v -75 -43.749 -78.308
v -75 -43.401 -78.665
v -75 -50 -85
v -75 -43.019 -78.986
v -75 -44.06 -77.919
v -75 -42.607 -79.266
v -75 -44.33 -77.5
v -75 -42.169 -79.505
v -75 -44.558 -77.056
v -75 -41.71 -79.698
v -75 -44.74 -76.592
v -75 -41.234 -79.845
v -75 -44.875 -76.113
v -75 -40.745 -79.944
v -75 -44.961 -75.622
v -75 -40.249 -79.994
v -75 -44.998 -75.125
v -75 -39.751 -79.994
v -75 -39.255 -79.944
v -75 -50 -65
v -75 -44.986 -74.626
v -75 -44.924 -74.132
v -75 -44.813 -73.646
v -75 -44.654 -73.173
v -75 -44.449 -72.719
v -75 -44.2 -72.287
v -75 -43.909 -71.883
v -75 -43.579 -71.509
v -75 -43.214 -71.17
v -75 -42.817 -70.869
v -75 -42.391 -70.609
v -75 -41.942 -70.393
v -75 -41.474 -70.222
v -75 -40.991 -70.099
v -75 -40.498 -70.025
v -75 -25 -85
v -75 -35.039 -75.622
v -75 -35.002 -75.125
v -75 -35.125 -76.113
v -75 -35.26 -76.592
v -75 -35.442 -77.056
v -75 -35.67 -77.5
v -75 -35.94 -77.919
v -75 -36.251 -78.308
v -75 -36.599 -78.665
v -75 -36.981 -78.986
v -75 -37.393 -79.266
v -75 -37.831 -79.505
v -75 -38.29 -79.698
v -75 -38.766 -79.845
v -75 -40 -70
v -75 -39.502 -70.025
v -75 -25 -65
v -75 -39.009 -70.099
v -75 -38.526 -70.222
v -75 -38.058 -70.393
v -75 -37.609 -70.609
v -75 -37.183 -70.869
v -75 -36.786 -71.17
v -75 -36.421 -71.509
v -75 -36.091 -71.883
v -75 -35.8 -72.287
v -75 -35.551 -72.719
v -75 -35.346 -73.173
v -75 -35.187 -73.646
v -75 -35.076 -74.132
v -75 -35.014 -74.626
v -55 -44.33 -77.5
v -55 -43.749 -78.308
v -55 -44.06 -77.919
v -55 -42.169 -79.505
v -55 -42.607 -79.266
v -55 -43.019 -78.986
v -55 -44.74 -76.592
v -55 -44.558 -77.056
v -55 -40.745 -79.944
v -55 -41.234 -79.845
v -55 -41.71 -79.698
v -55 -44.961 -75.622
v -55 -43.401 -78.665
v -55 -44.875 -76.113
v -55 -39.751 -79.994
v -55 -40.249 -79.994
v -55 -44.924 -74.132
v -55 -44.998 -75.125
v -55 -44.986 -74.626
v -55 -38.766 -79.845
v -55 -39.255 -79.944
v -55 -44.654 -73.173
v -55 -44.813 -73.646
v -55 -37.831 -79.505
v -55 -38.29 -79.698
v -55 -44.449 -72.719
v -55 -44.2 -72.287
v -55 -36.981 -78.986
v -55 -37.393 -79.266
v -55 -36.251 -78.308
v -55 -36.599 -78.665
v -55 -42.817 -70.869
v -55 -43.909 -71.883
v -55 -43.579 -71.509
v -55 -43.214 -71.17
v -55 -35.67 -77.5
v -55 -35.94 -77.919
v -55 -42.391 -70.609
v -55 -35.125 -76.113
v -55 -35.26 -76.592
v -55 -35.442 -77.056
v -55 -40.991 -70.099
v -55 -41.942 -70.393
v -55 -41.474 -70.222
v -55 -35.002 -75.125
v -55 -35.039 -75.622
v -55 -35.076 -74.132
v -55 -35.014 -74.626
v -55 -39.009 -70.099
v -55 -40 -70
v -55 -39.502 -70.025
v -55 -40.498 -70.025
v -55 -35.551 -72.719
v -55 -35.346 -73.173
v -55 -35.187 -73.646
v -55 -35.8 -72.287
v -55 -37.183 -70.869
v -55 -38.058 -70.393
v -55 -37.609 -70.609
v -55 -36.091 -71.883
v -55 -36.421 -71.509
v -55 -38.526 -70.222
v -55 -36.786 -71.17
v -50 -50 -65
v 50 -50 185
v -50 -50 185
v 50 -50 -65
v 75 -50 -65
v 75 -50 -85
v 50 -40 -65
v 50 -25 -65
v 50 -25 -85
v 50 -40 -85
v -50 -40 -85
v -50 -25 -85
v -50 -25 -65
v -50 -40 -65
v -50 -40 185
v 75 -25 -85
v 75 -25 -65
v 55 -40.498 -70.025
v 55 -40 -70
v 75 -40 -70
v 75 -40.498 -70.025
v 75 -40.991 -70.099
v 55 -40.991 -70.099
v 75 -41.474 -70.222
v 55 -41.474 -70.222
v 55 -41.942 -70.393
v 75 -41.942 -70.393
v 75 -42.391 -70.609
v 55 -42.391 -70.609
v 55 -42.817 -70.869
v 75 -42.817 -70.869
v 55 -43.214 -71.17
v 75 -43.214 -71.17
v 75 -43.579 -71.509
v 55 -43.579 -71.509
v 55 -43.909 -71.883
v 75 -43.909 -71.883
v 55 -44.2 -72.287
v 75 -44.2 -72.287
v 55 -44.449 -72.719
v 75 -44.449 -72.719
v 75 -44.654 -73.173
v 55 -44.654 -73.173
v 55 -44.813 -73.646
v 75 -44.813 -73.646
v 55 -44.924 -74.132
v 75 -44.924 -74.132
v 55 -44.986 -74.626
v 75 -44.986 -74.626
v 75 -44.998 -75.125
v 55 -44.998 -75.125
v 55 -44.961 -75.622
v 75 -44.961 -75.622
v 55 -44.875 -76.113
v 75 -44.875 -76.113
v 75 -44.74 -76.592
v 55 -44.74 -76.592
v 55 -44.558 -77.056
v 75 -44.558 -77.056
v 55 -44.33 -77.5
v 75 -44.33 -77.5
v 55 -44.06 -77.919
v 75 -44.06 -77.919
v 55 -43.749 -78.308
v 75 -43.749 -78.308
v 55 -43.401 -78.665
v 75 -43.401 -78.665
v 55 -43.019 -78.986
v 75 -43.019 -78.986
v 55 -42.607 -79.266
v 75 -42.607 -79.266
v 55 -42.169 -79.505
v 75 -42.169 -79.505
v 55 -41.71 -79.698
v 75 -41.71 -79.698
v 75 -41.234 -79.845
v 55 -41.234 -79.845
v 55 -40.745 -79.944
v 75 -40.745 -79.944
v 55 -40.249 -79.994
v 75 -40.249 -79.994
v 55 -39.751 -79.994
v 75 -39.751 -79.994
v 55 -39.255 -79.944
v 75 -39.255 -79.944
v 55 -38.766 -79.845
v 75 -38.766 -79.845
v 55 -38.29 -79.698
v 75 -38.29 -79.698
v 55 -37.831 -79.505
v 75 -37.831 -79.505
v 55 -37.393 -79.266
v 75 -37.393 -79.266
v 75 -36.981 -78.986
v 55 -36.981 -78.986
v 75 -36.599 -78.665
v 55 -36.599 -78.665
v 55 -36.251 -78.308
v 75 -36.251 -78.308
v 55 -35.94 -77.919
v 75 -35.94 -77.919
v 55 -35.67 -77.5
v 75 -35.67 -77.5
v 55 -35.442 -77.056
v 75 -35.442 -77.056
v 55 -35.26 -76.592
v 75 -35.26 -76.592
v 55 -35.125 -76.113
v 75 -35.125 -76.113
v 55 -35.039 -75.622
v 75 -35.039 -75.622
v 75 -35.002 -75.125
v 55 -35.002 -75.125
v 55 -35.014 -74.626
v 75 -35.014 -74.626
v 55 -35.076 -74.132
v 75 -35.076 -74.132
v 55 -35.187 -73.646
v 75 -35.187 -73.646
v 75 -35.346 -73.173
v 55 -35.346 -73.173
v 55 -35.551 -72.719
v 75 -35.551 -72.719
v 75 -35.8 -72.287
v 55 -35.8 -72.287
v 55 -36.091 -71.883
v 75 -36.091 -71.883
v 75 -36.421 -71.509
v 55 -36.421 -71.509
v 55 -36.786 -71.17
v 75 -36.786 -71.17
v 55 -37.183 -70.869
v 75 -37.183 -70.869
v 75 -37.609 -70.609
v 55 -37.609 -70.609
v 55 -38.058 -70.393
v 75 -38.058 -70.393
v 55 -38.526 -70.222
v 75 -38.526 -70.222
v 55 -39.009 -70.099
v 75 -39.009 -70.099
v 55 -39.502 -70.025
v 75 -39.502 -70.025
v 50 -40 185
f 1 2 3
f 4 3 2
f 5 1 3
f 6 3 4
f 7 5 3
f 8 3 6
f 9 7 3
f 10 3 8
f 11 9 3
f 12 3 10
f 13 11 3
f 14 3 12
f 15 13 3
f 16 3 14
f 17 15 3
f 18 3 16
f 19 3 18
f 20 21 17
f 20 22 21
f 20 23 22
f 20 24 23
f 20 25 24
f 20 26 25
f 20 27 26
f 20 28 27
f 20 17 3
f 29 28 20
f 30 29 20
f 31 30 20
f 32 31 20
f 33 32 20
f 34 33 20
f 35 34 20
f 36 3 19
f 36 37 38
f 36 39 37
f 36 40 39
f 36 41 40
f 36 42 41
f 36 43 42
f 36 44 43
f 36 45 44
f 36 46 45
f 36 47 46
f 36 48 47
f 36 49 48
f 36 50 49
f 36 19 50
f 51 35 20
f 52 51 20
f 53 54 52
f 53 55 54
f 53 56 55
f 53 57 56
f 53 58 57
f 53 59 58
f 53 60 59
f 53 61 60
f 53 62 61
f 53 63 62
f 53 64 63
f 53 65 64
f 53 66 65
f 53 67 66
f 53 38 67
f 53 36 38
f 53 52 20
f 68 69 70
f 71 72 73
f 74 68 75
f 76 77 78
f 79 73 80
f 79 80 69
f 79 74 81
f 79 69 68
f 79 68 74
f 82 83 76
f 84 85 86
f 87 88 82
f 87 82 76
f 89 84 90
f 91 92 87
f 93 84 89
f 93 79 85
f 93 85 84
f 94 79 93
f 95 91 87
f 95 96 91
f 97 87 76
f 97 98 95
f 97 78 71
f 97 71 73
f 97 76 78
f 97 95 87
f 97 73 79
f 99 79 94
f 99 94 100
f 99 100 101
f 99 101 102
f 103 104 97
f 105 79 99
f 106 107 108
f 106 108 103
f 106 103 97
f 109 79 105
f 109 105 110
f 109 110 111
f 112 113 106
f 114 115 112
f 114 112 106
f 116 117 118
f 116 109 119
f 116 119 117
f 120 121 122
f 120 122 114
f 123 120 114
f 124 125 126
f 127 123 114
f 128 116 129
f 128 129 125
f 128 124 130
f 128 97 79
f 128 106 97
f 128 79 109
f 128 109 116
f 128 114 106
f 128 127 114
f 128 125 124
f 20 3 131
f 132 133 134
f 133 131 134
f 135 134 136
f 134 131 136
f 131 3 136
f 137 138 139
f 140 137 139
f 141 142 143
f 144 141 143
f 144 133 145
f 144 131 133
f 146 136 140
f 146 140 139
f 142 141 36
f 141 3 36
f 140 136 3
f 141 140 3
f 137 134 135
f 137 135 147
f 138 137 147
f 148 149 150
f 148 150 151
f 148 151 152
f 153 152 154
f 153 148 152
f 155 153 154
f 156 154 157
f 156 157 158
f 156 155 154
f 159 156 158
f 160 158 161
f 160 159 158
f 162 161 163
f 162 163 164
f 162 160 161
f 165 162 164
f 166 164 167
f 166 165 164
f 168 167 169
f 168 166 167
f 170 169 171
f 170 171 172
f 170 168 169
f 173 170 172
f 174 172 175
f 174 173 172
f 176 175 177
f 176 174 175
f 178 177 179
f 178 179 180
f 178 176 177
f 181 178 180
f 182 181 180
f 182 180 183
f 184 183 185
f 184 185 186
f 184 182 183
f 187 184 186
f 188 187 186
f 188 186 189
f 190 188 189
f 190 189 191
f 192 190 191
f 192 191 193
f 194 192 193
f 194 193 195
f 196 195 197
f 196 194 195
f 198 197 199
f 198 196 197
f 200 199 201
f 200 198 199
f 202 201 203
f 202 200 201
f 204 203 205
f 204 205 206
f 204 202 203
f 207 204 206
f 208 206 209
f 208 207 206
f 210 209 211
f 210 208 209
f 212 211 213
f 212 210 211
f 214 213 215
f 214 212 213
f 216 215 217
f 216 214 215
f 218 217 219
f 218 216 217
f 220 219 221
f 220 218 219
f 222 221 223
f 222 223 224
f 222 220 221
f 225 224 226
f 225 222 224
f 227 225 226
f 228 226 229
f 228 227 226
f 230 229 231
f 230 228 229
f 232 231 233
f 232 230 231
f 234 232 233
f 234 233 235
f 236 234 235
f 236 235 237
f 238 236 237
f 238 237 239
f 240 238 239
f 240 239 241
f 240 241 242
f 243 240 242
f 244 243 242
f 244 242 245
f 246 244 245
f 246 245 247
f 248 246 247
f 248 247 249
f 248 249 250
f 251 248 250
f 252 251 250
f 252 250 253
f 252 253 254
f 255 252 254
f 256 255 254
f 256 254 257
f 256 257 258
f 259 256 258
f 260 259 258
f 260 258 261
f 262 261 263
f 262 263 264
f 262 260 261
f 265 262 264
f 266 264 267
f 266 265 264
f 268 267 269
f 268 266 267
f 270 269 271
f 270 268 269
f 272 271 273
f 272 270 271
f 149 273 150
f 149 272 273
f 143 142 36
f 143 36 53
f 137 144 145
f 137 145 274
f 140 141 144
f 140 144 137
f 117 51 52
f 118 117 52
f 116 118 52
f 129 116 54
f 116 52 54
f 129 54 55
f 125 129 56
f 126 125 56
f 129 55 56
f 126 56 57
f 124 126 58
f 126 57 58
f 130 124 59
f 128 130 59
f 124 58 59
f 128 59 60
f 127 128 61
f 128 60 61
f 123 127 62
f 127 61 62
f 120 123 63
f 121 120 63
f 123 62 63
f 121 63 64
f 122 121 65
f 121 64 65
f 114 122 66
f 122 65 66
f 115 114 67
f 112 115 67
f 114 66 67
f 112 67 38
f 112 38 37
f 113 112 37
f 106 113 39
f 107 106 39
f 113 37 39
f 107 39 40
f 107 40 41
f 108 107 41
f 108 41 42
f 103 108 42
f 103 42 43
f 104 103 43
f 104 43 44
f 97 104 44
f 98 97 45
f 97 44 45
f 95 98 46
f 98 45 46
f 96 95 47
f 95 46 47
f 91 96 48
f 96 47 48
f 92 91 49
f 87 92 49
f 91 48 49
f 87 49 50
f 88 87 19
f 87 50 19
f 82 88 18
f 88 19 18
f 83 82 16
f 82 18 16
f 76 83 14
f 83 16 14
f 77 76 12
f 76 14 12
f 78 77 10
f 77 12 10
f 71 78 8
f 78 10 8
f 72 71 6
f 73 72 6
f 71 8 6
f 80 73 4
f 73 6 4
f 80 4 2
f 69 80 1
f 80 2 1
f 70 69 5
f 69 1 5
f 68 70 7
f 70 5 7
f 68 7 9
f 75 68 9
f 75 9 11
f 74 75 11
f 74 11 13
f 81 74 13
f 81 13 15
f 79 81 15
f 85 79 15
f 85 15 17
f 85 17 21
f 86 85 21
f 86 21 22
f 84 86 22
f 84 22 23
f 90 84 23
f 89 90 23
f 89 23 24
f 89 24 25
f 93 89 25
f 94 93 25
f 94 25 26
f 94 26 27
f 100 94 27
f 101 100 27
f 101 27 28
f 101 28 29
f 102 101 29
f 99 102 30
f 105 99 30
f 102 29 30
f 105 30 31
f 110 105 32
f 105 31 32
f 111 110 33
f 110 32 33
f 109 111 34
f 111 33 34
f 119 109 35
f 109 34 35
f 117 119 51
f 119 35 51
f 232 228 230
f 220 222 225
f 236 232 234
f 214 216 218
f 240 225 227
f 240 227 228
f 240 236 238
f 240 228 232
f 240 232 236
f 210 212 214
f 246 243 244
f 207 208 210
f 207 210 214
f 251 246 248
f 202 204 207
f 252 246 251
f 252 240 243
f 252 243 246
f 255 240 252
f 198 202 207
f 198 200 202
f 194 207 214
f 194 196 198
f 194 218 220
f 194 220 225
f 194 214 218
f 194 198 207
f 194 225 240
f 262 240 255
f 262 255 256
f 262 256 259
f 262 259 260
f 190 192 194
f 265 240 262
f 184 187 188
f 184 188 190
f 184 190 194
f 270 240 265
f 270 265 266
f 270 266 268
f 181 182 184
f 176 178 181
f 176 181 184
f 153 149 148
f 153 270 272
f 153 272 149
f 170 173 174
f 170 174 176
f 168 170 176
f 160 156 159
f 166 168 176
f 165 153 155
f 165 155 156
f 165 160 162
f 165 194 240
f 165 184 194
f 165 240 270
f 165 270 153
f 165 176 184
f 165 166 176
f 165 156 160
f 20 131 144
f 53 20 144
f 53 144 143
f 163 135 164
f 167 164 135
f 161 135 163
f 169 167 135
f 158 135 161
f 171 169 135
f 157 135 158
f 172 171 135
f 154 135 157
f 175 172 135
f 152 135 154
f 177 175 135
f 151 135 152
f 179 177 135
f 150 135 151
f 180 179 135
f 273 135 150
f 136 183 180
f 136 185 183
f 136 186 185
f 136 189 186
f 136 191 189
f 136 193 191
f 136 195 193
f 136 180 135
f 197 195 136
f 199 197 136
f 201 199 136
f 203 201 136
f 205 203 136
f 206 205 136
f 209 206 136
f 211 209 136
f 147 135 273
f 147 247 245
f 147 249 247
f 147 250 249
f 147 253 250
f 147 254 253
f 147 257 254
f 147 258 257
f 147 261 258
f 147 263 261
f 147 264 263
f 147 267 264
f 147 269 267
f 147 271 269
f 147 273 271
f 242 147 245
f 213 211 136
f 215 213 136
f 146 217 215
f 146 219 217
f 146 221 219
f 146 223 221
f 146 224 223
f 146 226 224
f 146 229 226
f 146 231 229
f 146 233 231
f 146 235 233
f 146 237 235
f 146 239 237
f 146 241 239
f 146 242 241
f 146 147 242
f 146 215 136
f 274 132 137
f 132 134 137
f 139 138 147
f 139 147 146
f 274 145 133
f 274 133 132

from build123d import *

# Parameters (mm, degrees)
SKETCH5_W           = 100
SKETCH5_H           = 170
BOSS_EXTRUDE2_DEPTH = 10
SKETCH7_W           = 20
SKETCH7_H           = 25
BOSS_EXTRUDE3_DEPTH = 25
SKETCH8_W           = 20
SKETCH8_H           = 25
BOSS_EXTRUDE4_DEPTH = 25
SKETCH11_R          = 5
CUT_EXTRUDE1_DEPTH  = 20
CUT_EXTRUDE2_START  = -20
SKETCH12_R          = 5
CUT_EXTRUDE2_DEPTH  = 20
SKETCH17_W          = 100
SKETCH17_H          = 10
BOSS_EXTRUDE6_DEPTH = 100


with BuildPart() as part:
    # Sketch5 → Boss-Extrude2 (new body)
    with BuildSketch(Plane(origin=(0, -50, 0), x_dir=(-1, 0, 0), z_dir=(0, -1, 0))):
        Rectangle(SKETCH5_W, SKETCH5_H)
    extrude(amount=-BOSS_EXTRUDE2_DEPTH)

    # Sketch7 → Boss-Extrude3 (add)
    with BuildSketch(Plane.ZY.offset(50)):
        with Locations((-75, -37.5)):
            Rectangle(SKETCH7_W, SKETCH7_H)
    extrude(amount=BOSS_EXTRUDE3_DEPTH)

    # Sketch8 → Boss-Extrude4 (add)
    with BuildSketch(Plane(origin=(50, 0, 0), x_dir=(0, 0, -1), z_dir=(1, 0, 0))):
        with Locations((75, -37.5)):
            Rectangle(SKETCH8_W, SKETCH8_H)
    extrude(amount=BOSS_EXTRUDE4_DEPTH)

    # Sketch11 → Cut-Extrude1 (cut)
    with BuildSketch(Plane.ZY.offset(75)):
        with Locations((-75, -40)):
            Circle(SKETCH11_R)
    extrude(amount=-CUT_EXTRUDE1_DEPTH, mode=Mode.SUBTRACT)

    # Sketch12 → Cut-Extrude2 (cut)
    with BuildSketch(Plane(origin=(75, 0, 0), x_dir=(0, 0, -1), z_dir=(1, 0, 0)).offset(CUT_EXTRUDE2_START)):
        with Locations(Location((75, -40, 0), (0, 0, 180))):
            Circle(SKETCH12_R)
    extrude(amount=CUT_EXTRUDE2_DEPTH, mode=Mode.SUBTRACT)

    # Sketch17 → Boss-Extrude6 (add)
    with BuildSketch(Plane.XY.offset(85)):
        with Locations((0, -45)):
            Rectangle(SKETCH17_W, SKETCH17_H)
    extrude(amount=BOSS_EXTRUDE6_DEPTH)


solid = part.part
